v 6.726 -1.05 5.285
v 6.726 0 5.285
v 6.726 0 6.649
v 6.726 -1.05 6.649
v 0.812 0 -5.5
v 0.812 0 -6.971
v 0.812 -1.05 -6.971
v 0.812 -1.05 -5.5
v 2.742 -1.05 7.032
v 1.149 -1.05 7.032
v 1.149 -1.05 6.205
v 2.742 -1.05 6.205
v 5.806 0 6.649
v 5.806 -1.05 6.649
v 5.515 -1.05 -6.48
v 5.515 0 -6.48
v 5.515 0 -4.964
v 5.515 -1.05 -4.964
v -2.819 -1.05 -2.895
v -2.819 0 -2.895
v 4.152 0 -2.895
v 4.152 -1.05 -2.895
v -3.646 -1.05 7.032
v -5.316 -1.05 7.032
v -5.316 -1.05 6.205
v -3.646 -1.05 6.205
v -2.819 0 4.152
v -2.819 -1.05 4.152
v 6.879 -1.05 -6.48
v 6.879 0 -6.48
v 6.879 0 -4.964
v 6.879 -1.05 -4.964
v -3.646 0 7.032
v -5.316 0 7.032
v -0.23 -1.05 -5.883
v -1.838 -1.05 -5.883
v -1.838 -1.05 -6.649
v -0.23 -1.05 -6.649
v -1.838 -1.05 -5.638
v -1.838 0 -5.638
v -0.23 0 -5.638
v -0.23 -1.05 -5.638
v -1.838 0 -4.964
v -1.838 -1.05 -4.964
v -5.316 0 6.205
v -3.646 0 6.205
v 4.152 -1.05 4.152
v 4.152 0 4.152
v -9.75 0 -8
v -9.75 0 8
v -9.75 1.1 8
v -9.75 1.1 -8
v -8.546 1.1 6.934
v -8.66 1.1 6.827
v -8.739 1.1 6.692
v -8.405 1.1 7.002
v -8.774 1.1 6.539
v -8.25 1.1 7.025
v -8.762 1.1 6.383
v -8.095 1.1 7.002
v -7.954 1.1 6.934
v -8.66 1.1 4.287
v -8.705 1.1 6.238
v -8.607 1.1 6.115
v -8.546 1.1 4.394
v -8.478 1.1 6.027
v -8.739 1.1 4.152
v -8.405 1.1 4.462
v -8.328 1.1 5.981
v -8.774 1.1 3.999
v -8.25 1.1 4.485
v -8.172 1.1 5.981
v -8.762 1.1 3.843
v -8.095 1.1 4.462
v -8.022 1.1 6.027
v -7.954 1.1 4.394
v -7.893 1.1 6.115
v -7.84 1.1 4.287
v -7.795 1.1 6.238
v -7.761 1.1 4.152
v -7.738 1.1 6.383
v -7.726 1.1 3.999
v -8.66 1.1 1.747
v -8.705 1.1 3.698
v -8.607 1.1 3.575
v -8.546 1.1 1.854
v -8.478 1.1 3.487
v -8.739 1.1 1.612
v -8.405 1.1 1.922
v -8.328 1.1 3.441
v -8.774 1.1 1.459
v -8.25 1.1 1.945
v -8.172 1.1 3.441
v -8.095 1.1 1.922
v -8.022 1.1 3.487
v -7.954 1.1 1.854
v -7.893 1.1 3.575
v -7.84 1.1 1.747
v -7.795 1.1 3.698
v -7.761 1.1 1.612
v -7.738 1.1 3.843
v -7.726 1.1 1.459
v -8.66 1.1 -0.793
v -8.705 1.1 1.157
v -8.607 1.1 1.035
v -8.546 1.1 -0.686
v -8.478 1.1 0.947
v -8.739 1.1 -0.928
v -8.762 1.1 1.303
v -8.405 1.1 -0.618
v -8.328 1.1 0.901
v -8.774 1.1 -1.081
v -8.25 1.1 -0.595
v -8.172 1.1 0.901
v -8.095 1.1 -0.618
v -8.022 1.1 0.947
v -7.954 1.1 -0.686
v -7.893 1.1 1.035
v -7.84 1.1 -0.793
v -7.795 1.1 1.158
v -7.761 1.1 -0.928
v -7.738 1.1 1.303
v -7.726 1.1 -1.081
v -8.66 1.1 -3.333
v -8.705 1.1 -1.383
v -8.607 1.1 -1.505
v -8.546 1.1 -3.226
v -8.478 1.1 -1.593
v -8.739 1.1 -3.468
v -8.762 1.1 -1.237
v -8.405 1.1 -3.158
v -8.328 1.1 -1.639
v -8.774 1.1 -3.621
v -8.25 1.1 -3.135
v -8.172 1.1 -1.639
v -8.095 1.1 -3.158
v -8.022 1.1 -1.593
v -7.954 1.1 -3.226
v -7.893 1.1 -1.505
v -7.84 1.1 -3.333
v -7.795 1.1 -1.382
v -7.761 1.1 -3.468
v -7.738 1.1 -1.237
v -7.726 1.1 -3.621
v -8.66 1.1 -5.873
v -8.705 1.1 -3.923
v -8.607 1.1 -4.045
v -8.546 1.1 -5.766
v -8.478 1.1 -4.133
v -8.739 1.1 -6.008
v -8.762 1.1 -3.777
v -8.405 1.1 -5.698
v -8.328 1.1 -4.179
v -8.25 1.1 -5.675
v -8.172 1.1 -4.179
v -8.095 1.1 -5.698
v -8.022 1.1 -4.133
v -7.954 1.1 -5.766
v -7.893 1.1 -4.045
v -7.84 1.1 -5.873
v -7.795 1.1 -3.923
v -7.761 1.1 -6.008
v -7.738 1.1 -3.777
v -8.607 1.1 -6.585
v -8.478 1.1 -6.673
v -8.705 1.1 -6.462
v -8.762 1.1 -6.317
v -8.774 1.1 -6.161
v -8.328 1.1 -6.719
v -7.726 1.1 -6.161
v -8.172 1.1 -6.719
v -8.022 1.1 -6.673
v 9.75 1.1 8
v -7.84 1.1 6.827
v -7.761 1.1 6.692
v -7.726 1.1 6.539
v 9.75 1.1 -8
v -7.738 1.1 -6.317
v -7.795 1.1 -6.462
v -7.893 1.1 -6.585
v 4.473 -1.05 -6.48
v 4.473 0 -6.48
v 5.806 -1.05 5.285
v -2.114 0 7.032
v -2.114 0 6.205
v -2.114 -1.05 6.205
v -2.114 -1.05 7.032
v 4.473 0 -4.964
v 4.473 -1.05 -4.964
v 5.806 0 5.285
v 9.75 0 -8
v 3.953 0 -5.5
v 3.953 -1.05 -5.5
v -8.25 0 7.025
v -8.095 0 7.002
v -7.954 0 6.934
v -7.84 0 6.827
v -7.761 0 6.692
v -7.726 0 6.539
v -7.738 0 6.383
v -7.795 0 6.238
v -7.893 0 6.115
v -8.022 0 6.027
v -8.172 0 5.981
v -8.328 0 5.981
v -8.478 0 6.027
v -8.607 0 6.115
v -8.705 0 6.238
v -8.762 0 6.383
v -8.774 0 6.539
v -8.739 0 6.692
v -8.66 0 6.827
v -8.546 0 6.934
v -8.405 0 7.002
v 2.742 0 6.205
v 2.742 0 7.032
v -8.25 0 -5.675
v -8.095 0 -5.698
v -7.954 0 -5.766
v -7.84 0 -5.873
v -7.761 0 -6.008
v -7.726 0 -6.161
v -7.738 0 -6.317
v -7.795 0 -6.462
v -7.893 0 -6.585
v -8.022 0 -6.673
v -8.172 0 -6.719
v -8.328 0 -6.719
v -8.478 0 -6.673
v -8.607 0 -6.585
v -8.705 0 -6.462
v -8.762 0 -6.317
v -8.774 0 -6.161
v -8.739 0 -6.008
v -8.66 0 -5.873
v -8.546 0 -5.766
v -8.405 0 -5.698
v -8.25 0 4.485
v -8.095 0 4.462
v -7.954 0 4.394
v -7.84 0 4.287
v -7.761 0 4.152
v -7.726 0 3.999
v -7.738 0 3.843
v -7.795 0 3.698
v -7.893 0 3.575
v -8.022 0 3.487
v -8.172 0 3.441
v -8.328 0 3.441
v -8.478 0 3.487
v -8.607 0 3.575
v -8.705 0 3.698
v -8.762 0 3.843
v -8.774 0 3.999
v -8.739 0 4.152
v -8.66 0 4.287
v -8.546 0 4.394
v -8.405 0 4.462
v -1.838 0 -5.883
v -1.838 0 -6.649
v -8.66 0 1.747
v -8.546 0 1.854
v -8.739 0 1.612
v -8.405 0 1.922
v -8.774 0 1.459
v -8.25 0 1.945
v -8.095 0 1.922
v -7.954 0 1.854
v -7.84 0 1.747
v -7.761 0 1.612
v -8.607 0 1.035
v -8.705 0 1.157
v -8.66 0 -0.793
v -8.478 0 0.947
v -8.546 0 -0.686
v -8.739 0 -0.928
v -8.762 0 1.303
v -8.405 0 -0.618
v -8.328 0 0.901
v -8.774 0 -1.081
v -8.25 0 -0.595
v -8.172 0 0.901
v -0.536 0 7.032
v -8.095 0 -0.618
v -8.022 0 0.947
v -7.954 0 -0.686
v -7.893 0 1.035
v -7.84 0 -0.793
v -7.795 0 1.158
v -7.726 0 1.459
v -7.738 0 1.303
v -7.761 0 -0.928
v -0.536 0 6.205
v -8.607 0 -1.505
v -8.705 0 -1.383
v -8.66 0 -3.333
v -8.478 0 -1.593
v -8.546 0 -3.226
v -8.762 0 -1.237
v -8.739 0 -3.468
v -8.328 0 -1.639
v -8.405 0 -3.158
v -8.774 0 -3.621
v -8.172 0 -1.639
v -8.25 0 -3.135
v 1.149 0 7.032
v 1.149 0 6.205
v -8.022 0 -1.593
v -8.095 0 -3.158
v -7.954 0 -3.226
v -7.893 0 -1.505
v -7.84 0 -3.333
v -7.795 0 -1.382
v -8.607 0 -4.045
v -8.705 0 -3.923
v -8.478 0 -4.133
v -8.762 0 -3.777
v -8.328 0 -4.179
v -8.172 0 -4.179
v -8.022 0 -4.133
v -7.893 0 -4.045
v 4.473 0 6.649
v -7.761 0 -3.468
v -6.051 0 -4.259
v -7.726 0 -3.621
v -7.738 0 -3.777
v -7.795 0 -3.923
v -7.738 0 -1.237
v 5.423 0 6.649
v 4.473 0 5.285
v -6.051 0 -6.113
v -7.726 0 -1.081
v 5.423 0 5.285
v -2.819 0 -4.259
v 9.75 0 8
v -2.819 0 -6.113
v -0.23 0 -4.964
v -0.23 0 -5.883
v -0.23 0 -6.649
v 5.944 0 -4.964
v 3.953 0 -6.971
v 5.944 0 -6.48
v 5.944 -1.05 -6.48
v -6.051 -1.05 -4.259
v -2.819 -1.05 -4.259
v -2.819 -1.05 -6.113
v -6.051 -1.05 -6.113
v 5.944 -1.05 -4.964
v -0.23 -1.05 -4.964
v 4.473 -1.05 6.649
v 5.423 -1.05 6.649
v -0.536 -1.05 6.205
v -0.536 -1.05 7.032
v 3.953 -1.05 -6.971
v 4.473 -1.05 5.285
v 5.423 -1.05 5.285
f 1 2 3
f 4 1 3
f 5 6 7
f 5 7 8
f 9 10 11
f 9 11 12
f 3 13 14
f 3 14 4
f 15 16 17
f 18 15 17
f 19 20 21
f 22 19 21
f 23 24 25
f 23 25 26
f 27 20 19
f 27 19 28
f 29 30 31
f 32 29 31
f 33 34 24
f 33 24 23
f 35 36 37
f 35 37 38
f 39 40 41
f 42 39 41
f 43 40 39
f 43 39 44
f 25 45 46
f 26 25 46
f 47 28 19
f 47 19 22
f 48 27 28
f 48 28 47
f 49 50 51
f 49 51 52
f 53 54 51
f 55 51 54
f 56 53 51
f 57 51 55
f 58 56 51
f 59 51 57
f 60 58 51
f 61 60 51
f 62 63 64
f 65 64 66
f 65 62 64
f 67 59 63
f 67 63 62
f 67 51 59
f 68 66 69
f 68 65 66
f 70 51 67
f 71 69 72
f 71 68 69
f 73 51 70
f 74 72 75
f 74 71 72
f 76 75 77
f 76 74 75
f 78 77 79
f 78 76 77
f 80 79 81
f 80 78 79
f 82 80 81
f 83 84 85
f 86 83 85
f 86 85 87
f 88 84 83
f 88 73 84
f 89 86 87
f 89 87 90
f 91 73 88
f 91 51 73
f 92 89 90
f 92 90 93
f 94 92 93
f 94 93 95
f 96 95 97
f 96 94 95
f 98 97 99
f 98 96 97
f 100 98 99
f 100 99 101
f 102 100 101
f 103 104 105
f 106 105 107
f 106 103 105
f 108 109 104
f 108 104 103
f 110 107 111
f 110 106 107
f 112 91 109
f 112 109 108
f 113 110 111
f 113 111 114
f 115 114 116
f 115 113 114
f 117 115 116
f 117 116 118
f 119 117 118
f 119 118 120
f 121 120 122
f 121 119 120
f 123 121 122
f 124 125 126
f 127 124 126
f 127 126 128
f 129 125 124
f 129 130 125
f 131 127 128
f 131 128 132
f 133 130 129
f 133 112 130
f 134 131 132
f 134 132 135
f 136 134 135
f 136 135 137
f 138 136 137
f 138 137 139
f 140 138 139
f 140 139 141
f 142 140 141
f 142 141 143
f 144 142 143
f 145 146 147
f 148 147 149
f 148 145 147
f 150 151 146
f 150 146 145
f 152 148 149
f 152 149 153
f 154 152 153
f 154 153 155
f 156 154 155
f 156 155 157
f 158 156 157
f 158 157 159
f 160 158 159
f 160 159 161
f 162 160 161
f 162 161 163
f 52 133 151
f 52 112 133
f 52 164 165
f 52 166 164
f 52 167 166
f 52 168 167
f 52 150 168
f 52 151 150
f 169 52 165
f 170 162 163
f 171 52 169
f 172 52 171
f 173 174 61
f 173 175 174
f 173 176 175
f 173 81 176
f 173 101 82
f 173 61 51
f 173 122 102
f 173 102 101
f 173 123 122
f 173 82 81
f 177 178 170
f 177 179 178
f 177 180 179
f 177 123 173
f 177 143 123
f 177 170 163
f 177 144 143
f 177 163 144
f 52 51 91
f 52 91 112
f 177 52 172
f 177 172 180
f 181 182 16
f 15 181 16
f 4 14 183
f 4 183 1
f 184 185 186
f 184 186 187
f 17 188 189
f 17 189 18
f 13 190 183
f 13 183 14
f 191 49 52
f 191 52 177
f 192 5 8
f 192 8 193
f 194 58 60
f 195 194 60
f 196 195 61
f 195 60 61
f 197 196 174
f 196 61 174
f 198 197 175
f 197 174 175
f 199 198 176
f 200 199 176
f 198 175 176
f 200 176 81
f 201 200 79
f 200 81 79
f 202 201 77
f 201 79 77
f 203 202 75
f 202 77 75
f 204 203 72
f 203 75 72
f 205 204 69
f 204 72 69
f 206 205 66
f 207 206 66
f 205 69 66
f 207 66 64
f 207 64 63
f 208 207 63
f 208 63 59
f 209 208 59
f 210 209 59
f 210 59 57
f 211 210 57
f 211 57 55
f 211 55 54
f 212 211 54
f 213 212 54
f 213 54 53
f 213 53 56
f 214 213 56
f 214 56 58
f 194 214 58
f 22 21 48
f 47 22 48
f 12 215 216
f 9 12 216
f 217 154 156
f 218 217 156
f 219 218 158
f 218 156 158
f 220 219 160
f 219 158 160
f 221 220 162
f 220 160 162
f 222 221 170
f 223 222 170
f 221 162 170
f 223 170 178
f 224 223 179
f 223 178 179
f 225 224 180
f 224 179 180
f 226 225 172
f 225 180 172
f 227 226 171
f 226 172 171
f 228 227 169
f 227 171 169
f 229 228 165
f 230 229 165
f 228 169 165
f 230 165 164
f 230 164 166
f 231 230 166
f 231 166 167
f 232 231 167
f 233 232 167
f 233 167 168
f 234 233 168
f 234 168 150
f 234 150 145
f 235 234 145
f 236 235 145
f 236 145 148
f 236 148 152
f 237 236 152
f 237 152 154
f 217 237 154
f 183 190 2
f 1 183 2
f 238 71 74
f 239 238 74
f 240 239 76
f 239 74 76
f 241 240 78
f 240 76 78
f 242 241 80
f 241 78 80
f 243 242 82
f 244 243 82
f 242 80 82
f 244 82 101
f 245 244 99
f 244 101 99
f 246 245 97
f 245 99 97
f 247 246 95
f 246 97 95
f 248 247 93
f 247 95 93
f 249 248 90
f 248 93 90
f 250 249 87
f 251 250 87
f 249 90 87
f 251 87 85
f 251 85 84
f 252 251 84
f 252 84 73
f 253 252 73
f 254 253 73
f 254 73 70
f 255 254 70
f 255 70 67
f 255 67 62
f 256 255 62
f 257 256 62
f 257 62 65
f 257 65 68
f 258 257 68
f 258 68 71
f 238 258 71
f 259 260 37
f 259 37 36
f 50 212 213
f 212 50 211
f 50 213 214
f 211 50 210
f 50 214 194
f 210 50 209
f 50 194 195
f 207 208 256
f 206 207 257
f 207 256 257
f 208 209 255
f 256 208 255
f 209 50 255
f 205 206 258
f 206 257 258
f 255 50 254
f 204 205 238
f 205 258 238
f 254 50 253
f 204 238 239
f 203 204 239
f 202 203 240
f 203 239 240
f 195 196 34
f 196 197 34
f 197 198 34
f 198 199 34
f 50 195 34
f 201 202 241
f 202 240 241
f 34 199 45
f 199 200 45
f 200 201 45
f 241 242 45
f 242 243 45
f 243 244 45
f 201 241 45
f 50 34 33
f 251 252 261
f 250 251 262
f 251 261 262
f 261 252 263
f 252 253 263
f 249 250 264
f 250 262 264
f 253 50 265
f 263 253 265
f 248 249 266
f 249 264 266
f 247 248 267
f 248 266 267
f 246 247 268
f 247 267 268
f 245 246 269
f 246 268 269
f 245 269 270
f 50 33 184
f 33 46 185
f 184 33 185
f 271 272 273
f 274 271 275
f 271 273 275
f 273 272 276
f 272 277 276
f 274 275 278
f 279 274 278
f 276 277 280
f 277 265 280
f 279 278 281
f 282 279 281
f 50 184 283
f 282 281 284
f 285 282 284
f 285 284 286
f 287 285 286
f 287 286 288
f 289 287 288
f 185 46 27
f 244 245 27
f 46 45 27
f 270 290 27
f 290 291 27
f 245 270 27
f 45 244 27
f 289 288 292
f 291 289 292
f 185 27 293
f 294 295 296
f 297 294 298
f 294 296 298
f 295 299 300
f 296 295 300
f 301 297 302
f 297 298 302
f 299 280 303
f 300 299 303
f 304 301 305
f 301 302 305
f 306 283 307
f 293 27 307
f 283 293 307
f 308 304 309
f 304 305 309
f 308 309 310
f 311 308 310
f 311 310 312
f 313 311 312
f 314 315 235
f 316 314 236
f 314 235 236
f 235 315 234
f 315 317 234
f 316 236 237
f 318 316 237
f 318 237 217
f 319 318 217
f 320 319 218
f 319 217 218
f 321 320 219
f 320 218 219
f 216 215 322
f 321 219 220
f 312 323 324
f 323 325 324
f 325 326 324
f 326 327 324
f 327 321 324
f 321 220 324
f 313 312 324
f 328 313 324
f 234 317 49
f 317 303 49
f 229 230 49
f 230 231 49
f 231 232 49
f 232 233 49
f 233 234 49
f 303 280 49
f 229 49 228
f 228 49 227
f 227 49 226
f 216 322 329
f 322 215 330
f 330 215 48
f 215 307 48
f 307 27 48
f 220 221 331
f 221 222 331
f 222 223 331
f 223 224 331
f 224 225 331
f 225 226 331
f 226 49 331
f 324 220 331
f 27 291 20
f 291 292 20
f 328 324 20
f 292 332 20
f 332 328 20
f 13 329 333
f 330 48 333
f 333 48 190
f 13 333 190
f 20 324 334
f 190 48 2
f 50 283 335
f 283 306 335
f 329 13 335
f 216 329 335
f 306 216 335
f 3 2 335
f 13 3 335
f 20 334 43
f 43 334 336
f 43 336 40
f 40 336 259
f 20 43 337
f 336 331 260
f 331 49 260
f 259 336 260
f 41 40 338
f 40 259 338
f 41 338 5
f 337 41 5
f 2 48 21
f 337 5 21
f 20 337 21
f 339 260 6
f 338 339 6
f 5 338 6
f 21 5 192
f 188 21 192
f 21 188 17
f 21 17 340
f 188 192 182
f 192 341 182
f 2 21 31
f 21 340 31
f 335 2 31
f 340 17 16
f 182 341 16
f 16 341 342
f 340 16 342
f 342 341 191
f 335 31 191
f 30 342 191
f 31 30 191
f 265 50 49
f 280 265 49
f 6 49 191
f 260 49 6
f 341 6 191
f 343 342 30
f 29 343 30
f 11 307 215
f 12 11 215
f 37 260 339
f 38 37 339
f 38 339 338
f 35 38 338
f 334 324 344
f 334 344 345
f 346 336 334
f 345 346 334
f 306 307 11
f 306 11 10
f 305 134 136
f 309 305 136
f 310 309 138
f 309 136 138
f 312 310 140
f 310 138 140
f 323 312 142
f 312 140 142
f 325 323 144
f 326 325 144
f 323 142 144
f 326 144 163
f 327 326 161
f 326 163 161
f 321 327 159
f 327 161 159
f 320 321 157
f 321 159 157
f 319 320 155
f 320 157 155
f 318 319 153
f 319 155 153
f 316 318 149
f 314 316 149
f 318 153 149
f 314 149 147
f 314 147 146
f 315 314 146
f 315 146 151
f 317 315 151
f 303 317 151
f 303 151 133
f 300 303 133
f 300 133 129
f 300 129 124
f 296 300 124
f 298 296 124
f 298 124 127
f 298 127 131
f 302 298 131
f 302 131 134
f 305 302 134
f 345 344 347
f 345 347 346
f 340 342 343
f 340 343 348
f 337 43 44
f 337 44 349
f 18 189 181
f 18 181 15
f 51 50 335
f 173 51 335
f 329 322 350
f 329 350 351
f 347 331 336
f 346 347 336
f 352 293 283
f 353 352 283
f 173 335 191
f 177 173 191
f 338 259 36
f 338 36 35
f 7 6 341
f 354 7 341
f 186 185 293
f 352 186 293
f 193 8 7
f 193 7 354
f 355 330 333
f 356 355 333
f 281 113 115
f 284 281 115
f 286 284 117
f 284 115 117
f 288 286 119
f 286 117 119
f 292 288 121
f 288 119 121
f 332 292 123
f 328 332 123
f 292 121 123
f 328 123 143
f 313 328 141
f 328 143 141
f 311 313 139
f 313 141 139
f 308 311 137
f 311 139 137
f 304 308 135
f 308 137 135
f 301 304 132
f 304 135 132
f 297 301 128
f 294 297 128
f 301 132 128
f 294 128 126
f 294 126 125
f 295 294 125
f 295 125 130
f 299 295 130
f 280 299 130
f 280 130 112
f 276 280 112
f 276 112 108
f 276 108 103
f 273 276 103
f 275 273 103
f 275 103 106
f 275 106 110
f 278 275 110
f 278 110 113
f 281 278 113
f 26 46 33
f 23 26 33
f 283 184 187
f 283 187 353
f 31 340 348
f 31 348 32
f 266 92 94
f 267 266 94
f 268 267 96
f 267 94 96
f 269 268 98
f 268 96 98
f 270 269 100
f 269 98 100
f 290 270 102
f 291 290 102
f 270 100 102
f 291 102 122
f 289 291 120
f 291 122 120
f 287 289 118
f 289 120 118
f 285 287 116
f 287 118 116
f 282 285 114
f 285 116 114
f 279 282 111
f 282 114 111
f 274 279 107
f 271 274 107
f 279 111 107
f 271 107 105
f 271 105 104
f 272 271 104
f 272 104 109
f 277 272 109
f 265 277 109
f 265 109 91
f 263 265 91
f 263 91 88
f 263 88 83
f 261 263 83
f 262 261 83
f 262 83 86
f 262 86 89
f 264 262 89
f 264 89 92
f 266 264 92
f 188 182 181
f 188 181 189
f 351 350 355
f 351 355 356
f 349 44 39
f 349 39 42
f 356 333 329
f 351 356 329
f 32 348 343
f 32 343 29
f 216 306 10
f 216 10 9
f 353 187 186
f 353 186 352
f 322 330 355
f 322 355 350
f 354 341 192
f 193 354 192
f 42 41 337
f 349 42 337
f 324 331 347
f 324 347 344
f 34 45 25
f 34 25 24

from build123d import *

# Parameters (mm, degrees)
SKETCH1_W               = 19.5
SKETCH1_H               = 16
PCB_DEPTH               = 1.1
HOLES_REACH             = 14.66
SKETCH2_R               = 0.525
SKETCH3_W               = 6.970626183
SKETCH3_H               = 7.047226471
SKETCH3_W_2             = 3.232532143
SKETCH3_H_2             = 1.853726963
SKETCH3_W_3             = 1.608606043
SKETCH3_H_3             = 0.674082532
SKETCH3_H_4             = 0.766002877
SKETCH3_W_4             = 3.140611797
SKETCH3_H_5             = 1.470725524
SKETCH3_W_5             = 0.949843568
SKETCH3_H_6             = 1.363485122
SKETCH3_W_6             = 0.919203453
SKETCH3_W_7             = 1.593285985
SKETCH3_H_7             = 0.827283108
SKETCH3_W_8             = 1.577965927
SKETCH3_W_9             = 1.669886272
SKETCH3_W_10            = 1.041763914
SKETCH3_H_8             = 1.516685697
SKETCH3_W_11            = 0.93452351
BOTTOM_COMPONENTS_DEPTH = 1.05


with BuildPart() as part:
    # Sketch1 → PCB (new body)
    with BuildSketch(Plane(origin=(0, 0, 0), x_dir=(1, 0, 0), z_dir=(0, 1, 0))):
        Rectangle(SKETCH1_W, SKETCH1_H)
    extrude(amount=PCB_DEPTH)

    # Sketch2 → Holes (cut, up to next)
    with BuildSketch(Plane(origin=(0, 1.1, 0), x_dir=(1, 0, 0), z_dir=(0, 1, 0)), mode=Mode.PRIVATE) as holes_sk1:
        with Locations(Location((-8.25, -6.5, 0), (0, 0, 270))):
            Circle(SKETCH2_R)
    holes_tool1 = extrude(holes_sk1.sketch, amount=-HOLES_REACH, mode=Mode.PRIVATE) & part.part
    # Sketch2 → Holes (cut, up to next)
    with BuildSketch(Plane(origin=(0, 1.1, 0), x_dir=(1, 0, 0), z_dir=(0, 1, 0)), mode=Mode.PRIVATE) as holes_sk2:
        with Locations(Location((-8.25, -3.96, 0), (0, 0, 270))):
            Circle(SKETCH2_R)
    holes_tool2 = extrude(holes_sk2.sketch, amount=-HOLES_REACH, mode=Mode.PRIVATE) & part.part
    # Sketch2 → Holes (cut, up to next)
    with BuildSketch(Plane(origin=(0, 1.1, 0), x_dir=(1, 0, 0), z_dir=(0, 1, 0)), mode=Mode.PRIVATE) as holes_sk3:
        with Locations(Location((-8.25, -1.42, 0), (0, 0, 270))):
            Circle(SKETCH2_R)
    holes_tool3 = extrude(holes_sk3.sketch, amount=-HOLES_REACH, mode=Mode.PRIVATE) & part.part
    # Sketch2 → Holes (cut, up to next)
    with BuildSketch(Plane(origin=(0, 1.1, 0), x_dir=(1, 0, 0), z_dir=(0, 1, 0)), mode=Mode.PRIVATE) as holes_sk4:
        with Locations(Location((-8.25, 1.12, 0), (0, 0, 270))):
            Circle(SKETCH2_R)
    holes_tool4 = extrude(holes_sk4.sketch, amount=-HOLES_REACH, mode=Mode.PRIVATE) & part.part
    # Sketch2 → Holes (cut, up to next)
    with BuildSketch(Plane(origin=(0, 1.1, 0), x_dir=(1, 0, 0), z_dir=(0, 1, 0)), mode=Mode.PRIVATE) as holes_sk5:
        with Locations(Location((-8.25, 3.66, 0), (0, 0, 270))):
            Circle(SKETCH2_R)
    holes_tool5 = extrude(holes_sk5.sketch, amount=-HOLES_REACH, mode=Mode.PRIVATE) & part.part
    # Sketch2 → Holes (cut, up to next)
    with BuildSketch(Plane(origin=(0, 1.1, 0), x_dir=(1, 0, 0), z_dir=(0, 1, 0)), mode=Mode.PRIVATE) as holes_sk6:
        with Locations(Location((-8.25, 6.2, 0), (0, 0, 270))):
            Circle(SKETCH2_R)
    holes_tool6 = extrude(holes_sk6.sketch, amount=-HOLES_REACH, mode=Mode.PRIVATE) & part.part
    add(holes_tool1.solids().sort_by_distance((-8.25, 1.1, 6.5))[0], mode=Mode.SUBTRACT)
    add(holes_tool2.solids().sort_by_distance((-8.25, 1.1, 3.96))[0], mode=Mode.SUBTRACT)
    add(holes_tool3.solids().sort_by_distance((-8.25, 1.1, 1.42))[0], mode=Mode.SUBTRACT)
    add(holes_tool4.solids().sort_by_distance((-8.25, 1.1, -1.12))[0], mode=Mode.SUBTRACT)
    add(holes_tool5.solids().sort_by_distance((-8.25, 1.1, -3.66))[0], mode=Mode.SUBTRACT)
    add(holes_tool6.solids().sort_by_distance((-8.25, 1.1, -6.2))[0], mode=Mode.SUBTRACT)

    # Sketch3 → Bottom components (add)
    with BuildSketch(Plane.XZ):
        with Locations((0.666422503, 0.628122359)):
            Rectangle(SKETCH3_W, SKETCH3_H)
        with Locations((-4.43515666, -5.18583948)):
            Rectangle(SKETCH3_W_2, SKETCH3_H_2)
        with Locations((-1.034103885, -5.300739911)):
            Rectangle(SKETCH3_W_3, SKETCH3_H_3)
        with Locations((-1.034103885, -6.265903537)):
            Rectangle(SKETCH3_W_3, SKETCH3_H_4)
        with Locations((2.382268949, -6.235263421)):
            Rectangle(SKETCH3_W_4, SKETCH3_H_5)
        with Locations((4.948378587, 5.967162414)):
            Rectangle(SKETCH3_W_5, SKETCH3_H_6)
        with Locations((6.265903537, 5.967162414)):
            Rectangle(SKETCH3_W_6, SKETCH3_H_6)
        with Locations((1.945647309, 6.61826486)):
            Rectangle(SKETCH3_W_7, SKETCH3_H_7)
        with Locations((-1.325184978, 6.61826486)):
            Rectangle(SKETCH3_W_8, SKETCH3_H_7)
        with Locations((-4.481116832, 6.61826486)):
            Rectangle(SKETCH3_W_9, SKETCH3_H_7)
        with Locations((4.99433876, -5.722041494)):
            Rectangle(SKETCH3_W_10, SKETCH3_H_8)
        with Locations((6.411444083, -5.722041494)):
            Rectangle(SKETCH3_W_11, SKETCH3_H_8)
    extrude(amount=BOTTOM_COMPONENTS_DEPTH)


solid = part.part
